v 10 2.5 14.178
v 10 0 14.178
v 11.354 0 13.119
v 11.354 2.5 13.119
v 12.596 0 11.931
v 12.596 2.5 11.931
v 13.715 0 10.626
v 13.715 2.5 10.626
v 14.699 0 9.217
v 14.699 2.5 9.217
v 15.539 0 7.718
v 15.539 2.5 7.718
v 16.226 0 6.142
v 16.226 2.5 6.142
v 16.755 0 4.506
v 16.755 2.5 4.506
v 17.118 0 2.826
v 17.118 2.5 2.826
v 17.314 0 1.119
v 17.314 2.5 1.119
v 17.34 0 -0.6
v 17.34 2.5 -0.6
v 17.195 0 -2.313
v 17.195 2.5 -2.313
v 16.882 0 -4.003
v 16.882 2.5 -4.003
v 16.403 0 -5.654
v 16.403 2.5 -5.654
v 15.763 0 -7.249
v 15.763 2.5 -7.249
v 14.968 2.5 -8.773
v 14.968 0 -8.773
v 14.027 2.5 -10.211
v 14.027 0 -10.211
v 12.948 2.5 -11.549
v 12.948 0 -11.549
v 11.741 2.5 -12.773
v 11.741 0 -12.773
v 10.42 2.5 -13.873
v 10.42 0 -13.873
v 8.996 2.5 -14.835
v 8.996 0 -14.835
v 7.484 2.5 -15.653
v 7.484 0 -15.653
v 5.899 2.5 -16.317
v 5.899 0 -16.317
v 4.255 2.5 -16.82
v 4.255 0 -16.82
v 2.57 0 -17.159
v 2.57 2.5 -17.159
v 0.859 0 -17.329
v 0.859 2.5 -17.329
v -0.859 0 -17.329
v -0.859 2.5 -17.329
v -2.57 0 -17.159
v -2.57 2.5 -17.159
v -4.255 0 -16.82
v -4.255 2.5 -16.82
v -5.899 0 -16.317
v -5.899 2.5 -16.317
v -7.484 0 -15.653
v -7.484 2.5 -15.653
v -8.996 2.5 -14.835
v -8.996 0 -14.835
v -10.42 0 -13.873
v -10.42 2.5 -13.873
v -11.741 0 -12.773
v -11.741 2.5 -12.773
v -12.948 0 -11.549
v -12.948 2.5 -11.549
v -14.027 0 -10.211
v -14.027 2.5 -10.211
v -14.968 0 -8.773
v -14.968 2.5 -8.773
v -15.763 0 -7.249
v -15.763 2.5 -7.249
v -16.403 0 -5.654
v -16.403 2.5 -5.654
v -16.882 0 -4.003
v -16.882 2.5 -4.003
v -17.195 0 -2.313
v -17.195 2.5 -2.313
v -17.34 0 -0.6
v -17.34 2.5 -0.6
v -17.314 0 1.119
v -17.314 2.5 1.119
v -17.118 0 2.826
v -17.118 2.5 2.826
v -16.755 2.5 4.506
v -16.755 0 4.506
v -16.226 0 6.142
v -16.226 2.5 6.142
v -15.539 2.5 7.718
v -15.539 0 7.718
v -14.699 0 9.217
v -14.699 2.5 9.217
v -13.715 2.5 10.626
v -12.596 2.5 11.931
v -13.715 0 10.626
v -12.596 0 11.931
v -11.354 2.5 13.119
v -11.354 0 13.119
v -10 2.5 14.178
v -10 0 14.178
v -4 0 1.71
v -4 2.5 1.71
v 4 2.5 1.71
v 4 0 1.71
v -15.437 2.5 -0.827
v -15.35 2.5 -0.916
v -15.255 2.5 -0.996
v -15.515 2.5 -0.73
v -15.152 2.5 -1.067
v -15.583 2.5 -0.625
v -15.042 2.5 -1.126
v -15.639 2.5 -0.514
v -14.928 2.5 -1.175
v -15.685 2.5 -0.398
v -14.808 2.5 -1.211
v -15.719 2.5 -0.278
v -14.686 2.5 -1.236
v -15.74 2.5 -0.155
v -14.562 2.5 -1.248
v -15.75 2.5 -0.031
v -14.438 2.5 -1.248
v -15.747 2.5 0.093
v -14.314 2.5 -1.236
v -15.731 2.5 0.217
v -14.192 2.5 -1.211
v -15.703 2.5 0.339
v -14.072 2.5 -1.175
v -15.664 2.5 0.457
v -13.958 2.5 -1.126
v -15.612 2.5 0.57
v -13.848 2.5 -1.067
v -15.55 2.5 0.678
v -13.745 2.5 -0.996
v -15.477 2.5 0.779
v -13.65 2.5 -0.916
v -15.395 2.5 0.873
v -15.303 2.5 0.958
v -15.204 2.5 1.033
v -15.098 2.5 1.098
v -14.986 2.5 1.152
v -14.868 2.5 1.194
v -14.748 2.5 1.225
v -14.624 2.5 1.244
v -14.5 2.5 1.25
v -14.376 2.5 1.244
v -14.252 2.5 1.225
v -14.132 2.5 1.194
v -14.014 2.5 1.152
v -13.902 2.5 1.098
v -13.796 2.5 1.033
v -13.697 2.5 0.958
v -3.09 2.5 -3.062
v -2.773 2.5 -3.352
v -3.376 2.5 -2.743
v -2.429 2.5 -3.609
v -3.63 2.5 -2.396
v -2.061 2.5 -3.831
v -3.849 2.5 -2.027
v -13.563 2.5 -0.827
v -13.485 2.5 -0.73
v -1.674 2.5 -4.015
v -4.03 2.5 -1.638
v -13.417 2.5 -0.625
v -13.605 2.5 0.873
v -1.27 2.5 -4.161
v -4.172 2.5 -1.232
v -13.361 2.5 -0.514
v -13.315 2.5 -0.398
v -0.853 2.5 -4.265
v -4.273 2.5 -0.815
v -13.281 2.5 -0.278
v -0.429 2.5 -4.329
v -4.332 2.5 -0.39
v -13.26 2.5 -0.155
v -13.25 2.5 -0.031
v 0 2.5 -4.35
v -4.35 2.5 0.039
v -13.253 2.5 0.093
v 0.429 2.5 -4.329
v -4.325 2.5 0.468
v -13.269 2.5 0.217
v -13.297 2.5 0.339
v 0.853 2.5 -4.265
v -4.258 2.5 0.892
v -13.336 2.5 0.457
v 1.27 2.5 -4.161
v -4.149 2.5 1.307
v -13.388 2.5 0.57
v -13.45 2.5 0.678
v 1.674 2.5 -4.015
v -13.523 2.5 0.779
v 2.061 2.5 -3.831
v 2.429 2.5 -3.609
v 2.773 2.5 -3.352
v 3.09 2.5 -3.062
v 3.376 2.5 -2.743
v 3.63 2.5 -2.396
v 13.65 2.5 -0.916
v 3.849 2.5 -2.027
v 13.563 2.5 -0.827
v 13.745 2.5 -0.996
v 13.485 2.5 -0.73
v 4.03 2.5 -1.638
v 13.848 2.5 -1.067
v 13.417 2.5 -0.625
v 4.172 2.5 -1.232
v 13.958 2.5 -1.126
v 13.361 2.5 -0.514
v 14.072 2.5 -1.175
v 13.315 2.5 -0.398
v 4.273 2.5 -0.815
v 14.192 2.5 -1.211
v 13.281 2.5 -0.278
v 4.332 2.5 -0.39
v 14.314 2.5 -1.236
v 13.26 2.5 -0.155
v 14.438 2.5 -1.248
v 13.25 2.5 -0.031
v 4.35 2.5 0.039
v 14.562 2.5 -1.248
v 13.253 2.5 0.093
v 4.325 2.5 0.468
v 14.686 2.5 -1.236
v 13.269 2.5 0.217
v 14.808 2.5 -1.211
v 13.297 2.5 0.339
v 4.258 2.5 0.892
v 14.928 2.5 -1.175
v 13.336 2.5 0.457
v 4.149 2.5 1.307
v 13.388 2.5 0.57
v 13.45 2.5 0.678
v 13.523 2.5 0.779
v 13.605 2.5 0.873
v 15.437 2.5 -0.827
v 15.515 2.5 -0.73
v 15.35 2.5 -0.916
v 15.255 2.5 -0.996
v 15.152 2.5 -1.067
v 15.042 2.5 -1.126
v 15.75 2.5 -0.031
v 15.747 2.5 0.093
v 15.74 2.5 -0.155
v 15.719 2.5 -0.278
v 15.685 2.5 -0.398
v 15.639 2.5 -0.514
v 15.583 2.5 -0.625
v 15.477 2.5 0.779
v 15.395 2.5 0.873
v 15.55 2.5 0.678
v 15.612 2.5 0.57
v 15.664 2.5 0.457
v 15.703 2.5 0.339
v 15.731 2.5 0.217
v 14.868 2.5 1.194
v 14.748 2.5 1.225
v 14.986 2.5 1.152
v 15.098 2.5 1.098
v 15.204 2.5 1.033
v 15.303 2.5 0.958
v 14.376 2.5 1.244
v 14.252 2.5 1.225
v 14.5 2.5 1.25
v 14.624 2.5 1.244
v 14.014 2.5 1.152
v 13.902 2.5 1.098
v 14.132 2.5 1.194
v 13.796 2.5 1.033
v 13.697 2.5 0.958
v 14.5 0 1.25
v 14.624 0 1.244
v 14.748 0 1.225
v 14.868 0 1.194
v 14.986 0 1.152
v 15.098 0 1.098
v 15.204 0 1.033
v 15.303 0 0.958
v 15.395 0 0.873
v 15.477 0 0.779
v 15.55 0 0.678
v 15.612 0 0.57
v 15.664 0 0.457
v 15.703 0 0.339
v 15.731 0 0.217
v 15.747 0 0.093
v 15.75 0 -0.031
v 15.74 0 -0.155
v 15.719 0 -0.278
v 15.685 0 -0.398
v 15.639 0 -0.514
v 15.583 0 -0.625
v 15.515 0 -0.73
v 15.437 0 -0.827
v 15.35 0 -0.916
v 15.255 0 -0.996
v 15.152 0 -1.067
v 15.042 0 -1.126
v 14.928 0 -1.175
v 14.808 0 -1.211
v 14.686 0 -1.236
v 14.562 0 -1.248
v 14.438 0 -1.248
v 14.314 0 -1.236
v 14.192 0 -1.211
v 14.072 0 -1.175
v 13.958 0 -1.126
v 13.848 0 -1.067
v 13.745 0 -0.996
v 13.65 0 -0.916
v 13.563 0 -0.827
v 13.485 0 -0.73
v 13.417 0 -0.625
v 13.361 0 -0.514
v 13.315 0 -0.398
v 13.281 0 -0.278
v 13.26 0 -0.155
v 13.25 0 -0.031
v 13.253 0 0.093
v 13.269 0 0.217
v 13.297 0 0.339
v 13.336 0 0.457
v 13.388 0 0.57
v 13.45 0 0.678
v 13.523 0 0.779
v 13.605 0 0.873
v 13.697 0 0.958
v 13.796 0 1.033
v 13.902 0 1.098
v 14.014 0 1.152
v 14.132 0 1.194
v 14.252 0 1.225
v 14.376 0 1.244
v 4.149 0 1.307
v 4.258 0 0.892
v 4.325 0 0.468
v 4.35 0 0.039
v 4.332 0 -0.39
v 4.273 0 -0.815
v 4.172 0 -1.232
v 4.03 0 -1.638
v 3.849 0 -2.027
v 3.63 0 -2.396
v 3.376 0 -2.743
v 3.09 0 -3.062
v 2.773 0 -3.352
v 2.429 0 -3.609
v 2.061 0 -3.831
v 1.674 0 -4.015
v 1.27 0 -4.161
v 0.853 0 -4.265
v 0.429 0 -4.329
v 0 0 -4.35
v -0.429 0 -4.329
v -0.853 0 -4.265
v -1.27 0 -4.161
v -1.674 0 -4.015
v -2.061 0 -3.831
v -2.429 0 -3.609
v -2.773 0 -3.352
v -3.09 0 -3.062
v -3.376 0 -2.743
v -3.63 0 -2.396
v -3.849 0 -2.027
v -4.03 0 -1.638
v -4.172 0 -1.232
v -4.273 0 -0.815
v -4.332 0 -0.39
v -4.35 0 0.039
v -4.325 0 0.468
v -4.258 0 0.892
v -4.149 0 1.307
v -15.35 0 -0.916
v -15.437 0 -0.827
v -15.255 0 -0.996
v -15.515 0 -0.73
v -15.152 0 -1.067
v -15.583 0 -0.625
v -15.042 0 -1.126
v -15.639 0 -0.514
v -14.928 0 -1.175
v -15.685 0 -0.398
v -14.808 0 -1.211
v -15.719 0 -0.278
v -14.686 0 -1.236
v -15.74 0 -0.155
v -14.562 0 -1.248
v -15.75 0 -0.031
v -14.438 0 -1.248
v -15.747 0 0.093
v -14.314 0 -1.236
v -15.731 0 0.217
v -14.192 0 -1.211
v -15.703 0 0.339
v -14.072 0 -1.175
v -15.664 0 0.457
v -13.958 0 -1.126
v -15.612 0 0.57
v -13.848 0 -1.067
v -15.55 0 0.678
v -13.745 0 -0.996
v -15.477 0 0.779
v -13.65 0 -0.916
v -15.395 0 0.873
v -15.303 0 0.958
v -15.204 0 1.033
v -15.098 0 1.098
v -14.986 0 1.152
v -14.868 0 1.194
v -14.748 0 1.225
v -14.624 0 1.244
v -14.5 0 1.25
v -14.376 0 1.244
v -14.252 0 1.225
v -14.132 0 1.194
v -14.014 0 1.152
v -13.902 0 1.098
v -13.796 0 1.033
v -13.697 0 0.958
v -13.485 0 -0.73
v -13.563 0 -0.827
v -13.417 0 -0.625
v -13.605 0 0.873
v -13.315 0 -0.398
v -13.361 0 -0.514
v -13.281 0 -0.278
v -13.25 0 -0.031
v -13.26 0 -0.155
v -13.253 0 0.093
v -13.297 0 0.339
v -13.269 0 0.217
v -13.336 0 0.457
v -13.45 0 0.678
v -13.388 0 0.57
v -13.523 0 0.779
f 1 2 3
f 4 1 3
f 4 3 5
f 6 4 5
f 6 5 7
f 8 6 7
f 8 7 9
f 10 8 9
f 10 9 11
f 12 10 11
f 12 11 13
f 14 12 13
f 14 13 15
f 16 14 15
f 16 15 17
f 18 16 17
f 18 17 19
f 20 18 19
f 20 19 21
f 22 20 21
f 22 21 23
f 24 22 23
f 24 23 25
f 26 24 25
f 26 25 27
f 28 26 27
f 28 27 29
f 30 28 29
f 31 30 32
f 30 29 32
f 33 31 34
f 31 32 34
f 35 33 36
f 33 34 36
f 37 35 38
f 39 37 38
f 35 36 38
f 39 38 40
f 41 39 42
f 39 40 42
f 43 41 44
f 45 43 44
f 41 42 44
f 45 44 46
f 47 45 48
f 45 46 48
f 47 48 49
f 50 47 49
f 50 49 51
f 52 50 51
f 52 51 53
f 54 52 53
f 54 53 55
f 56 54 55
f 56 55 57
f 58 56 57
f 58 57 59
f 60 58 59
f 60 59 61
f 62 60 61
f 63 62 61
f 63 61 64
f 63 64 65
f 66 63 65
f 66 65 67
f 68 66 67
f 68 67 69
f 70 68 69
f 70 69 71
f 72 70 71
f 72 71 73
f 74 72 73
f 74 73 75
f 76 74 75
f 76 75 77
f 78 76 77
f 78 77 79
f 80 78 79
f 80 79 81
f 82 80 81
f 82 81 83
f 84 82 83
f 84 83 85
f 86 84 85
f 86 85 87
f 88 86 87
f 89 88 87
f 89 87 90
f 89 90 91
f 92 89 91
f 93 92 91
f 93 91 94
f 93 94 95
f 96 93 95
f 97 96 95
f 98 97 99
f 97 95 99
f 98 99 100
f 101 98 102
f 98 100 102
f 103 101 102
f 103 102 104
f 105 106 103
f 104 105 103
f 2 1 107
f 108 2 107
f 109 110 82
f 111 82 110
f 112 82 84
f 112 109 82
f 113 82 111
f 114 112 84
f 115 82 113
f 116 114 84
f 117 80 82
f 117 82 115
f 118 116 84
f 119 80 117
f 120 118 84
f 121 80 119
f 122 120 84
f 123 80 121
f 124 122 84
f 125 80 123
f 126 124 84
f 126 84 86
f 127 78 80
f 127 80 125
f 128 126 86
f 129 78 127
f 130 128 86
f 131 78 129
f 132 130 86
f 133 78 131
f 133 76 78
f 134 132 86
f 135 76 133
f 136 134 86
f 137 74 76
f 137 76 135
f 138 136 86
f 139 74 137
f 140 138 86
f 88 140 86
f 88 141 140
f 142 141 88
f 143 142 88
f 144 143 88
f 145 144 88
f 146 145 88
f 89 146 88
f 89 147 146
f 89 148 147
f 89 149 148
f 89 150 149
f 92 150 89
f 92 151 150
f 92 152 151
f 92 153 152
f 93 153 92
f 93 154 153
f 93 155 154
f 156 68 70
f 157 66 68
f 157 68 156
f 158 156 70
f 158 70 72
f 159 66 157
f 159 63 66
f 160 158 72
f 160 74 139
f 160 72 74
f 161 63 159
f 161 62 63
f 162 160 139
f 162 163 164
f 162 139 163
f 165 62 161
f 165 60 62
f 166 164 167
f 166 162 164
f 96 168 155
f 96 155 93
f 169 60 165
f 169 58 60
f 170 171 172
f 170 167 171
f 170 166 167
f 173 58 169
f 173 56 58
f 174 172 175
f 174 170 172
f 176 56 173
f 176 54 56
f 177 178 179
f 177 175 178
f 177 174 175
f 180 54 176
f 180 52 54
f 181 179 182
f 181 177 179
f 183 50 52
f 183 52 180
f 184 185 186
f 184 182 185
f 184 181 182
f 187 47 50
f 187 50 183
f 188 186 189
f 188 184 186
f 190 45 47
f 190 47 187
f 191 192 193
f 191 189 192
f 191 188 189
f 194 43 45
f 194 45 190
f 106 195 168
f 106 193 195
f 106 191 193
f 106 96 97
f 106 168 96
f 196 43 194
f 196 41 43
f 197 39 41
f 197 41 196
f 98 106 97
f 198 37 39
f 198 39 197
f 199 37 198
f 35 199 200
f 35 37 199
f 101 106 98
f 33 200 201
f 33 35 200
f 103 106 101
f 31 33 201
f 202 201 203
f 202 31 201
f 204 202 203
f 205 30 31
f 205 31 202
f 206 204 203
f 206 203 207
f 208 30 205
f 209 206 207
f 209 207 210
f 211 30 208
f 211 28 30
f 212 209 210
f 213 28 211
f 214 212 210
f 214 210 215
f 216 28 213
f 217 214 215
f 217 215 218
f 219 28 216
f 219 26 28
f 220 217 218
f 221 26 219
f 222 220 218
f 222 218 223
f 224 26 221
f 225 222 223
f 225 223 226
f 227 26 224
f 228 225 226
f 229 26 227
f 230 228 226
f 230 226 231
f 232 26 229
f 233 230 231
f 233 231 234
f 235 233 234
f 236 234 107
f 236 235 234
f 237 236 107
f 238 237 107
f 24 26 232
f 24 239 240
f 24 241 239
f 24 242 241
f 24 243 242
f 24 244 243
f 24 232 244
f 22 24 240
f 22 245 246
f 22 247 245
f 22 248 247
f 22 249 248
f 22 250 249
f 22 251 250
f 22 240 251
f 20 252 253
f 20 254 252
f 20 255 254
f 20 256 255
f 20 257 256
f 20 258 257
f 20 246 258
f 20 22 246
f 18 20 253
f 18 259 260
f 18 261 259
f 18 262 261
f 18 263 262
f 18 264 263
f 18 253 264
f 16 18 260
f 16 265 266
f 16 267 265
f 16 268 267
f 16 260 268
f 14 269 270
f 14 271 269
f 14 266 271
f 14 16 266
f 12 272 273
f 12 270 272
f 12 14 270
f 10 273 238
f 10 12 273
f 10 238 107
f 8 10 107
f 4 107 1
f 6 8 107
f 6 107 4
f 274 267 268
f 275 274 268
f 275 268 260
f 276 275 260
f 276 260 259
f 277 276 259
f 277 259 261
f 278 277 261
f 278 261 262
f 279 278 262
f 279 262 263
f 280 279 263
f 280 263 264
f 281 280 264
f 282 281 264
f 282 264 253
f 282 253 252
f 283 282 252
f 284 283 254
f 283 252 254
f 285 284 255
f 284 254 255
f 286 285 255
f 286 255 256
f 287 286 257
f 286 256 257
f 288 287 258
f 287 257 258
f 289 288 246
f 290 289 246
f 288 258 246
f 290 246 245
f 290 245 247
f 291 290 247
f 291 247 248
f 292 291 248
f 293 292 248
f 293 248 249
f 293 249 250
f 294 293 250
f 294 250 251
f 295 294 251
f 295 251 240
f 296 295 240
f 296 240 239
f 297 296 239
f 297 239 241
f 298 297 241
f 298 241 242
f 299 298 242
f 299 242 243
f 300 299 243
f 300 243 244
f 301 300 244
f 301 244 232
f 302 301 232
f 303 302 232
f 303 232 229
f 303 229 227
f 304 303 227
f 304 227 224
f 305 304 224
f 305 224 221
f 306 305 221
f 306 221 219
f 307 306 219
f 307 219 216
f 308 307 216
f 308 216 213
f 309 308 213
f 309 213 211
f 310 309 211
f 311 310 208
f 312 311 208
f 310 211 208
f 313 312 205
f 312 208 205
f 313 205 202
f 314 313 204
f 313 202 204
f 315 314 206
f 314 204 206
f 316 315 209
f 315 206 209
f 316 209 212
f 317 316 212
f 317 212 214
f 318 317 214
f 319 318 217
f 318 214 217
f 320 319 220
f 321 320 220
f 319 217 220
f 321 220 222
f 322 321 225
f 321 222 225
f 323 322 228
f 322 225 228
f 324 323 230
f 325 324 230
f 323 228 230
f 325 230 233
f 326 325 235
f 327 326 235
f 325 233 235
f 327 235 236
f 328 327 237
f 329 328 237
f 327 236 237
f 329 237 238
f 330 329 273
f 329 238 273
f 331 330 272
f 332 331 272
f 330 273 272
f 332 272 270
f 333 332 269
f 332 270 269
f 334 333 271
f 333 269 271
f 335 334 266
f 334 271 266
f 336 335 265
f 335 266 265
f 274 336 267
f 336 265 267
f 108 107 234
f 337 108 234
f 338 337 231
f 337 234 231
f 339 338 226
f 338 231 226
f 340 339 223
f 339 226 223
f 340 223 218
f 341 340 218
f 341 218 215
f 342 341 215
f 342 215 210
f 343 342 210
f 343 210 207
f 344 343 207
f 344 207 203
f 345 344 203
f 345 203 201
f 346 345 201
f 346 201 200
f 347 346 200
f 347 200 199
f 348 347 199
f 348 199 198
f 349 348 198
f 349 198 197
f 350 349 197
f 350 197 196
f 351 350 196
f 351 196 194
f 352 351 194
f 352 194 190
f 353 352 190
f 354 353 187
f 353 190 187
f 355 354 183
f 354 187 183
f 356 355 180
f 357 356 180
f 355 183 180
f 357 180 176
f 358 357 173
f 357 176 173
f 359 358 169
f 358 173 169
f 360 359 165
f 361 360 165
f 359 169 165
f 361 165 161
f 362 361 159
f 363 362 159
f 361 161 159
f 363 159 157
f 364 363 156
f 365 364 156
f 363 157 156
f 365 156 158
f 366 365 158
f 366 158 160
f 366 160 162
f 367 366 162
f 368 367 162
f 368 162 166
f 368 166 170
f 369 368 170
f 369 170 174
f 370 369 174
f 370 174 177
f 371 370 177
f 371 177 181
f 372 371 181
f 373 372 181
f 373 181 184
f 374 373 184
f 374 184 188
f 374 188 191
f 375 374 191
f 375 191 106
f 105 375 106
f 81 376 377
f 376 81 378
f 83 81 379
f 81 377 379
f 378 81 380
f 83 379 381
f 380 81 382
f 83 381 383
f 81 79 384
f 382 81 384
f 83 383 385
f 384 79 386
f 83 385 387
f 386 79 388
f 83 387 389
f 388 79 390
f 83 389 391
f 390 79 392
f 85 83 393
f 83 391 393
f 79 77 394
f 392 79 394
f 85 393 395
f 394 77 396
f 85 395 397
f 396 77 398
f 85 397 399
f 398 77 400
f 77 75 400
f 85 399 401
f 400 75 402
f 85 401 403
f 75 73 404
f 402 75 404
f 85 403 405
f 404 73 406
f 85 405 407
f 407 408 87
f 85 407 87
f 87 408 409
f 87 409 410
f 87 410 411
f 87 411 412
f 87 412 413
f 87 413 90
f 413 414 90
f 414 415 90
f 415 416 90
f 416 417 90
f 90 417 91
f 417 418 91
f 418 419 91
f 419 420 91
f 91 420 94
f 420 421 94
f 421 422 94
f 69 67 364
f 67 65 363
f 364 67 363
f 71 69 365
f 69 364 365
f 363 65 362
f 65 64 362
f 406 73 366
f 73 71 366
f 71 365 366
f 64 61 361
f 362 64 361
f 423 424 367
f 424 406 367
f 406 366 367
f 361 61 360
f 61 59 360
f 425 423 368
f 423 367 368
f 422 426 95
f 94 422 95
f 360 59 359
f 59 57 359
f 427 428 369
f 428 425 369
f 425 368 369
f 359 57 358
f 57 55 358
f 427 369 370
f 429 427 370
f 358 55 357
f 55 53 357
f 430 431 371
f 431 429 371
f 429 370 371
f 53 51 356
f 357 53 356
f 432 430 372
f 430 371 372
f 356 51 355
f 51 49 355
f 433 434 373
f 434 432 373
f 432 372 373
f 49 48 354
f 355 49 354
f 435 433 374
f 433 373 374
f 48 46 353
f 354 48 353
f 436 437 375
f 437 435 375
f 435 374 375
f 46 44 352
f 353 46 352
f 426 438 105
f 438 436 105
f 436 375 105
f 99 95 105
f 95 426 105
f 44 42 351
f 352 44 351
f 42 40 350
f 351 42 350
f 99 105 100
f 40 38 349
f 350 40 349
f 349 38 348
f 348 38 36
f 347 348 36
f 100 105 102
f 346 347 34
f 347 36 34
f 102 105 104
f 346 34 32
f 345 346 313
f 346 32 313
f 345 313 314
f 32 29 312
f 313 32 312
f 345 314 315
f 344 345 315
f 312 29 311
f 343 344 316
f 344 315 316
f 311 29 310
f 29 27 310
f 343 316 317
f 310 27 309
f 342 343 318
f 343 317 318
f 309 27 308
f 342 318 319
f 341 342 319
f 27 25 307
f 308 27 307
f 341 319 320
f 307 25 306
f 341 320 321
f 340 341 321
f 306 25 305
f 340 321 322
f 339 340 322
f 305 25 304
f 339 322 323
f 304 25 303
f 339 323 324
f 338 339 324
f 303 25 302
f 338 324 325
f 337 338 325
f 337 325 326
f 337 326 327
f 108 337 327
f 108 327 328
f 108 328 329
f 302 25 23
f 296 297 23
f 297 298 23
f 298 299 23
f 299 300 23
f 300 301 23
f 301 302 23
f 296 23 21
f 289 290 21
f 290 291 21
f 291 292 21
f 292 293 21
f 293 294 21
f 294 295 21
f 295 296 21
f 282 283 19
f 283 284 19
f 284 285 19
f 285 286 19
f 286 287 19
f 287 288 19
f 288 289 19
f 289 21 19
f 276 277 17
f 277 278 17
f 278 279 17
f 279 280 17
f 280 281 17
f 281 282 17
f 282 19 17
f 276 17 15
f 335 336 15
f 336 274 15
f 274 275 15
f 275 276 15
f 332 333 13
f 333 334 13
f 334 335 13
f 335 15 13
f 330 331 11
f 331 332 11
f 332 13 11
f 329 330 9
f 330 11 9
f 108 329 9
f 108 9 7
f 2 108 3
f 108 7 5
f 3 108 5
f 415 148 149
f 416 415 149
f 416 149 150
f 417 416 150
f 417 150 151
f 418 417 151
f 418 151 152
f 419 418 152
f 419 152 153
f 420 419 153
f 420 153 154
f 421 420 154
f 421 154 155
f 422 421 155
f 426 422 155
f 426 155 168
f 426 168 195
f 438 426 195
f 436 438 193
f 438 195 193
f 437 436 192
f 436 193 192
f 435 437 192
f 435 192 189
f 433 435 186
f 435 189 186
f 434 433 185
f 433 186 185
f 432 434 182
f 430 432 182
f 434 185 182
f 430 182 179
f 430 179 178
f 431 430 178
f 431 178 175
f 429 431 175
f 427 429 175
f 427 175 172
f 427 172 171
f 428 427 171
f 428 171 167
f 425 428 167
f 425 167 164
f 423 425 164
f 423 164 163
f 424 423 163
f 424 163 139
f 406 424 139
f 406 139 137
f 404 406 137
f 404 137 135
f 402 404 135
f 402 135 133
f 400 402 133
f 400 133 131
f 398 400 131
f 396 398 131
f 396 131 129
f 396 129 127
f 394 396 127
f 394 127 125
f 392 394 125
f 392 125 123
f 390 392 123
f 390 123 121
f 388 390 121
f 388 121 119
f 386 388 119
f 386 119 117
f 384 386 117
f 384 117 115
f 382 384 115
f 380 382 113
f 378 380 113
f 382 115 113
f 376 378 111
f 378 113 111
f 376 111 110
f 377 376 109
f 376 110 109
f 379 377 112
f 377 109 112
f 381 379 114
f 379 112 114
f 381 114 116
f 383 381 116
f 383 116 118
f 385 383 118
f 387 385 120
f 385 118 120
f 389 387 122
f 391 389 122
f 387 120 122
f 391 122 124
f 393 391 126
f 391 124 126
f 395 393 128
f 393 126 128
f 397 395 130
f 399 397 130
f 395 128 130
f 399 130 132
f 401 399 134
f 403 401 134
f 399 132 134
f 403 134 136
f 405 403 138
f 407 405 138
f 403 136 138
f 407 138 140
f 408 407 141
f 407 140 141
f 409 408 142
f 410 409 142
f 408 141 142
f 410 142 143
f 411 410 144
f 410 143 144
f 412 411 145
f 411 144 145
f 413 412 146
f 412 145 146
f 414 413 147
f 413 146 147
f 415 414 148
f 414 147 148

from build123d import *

# Parameters (mm, degrees)
SKETCH1_R           = 17.35
BOSS_EXTRUDE1_DEPTH = 2.5
SKETCH2_R           = 4.35
CUT_EXTRUDE1_DEPTH  = 25.663637201
SKETCH3_R           = 1.25
CUT_EXTRUDE2_DEPTH  = 25.663637201
CUT_EXTRUDE3_DEPTH  = 25.663637201


with BuildPart() as part:
    # Sketch1 → Boss-Extrude1 (new body)
    with BuildSketch(Plane(origin=(0, 0, 0), x_dir=(1, 0, 0), z_dir=(0, 1, 0))):
        with Locations(Location((0, 0, 0), (0, 0, 270))):
            Circle(SKETCH1_R)
    extrude(amount=BOSS_EXTRUDE1_DEPTH)

    # Sketch2 → Cut-Extrude1 (cut, through all)
    with BuildSketch(Plane(origin=(0, 2.5, 0), x_dir=(1, 0, 0), z_dir=(0, 1, 0))):
        with Locations(Location((0, 0, 0), (0, 0, 270))):
            Circle(SKETCH2_R)
    extrude(amount=-CUT_EXTRUDE1_DEPTH, mode=Mode.SUBTRACT)

    # Sketch3 → Cut-Extrude2 (cut, through all)
    with BuildSketch(Plane(origin=(0, 2.5, 0), x_dir=(1, 0, 0), z_dir=(0, 1, 0))):
        with Locations(Location((-14.5, 0, 0), (0, 0, 270))):
            Circle(SKETCH3_R)
        with Locations(Location((14.5, 0, 0), (0, 0, 270))):
            Circle(SKETCH3_R)
    extrude(amount=-CUT_EXTRUDE2_DEPTH, mode=Mode.SUBTRACT)

    # Sketch4 → Cut-Extrude3 (cut, through all)
    with BuildSketch(Plane(origin=(0, 2.5, 0), x_dir=(1, 0, 0), z_dir=(0, 1, 0))):
        with BuildLine():
            Line((-4, -1.7095321), (-10, -14.17824037))
            ThreePointArc((-10, -14.17824037), (0, -17.35), (10, -14.17824037))
            Line((10, -14.17824037), (4, -1.7095321))
            ThreePointArc((4, -1.7095321), (0, -4.35), (-4, -1.7095321))
        make_face()
    extrude(amount=-CUT_EXTRUDE3_DEPTH, mode=Mode.SUBTRACT)


solid = part.part
